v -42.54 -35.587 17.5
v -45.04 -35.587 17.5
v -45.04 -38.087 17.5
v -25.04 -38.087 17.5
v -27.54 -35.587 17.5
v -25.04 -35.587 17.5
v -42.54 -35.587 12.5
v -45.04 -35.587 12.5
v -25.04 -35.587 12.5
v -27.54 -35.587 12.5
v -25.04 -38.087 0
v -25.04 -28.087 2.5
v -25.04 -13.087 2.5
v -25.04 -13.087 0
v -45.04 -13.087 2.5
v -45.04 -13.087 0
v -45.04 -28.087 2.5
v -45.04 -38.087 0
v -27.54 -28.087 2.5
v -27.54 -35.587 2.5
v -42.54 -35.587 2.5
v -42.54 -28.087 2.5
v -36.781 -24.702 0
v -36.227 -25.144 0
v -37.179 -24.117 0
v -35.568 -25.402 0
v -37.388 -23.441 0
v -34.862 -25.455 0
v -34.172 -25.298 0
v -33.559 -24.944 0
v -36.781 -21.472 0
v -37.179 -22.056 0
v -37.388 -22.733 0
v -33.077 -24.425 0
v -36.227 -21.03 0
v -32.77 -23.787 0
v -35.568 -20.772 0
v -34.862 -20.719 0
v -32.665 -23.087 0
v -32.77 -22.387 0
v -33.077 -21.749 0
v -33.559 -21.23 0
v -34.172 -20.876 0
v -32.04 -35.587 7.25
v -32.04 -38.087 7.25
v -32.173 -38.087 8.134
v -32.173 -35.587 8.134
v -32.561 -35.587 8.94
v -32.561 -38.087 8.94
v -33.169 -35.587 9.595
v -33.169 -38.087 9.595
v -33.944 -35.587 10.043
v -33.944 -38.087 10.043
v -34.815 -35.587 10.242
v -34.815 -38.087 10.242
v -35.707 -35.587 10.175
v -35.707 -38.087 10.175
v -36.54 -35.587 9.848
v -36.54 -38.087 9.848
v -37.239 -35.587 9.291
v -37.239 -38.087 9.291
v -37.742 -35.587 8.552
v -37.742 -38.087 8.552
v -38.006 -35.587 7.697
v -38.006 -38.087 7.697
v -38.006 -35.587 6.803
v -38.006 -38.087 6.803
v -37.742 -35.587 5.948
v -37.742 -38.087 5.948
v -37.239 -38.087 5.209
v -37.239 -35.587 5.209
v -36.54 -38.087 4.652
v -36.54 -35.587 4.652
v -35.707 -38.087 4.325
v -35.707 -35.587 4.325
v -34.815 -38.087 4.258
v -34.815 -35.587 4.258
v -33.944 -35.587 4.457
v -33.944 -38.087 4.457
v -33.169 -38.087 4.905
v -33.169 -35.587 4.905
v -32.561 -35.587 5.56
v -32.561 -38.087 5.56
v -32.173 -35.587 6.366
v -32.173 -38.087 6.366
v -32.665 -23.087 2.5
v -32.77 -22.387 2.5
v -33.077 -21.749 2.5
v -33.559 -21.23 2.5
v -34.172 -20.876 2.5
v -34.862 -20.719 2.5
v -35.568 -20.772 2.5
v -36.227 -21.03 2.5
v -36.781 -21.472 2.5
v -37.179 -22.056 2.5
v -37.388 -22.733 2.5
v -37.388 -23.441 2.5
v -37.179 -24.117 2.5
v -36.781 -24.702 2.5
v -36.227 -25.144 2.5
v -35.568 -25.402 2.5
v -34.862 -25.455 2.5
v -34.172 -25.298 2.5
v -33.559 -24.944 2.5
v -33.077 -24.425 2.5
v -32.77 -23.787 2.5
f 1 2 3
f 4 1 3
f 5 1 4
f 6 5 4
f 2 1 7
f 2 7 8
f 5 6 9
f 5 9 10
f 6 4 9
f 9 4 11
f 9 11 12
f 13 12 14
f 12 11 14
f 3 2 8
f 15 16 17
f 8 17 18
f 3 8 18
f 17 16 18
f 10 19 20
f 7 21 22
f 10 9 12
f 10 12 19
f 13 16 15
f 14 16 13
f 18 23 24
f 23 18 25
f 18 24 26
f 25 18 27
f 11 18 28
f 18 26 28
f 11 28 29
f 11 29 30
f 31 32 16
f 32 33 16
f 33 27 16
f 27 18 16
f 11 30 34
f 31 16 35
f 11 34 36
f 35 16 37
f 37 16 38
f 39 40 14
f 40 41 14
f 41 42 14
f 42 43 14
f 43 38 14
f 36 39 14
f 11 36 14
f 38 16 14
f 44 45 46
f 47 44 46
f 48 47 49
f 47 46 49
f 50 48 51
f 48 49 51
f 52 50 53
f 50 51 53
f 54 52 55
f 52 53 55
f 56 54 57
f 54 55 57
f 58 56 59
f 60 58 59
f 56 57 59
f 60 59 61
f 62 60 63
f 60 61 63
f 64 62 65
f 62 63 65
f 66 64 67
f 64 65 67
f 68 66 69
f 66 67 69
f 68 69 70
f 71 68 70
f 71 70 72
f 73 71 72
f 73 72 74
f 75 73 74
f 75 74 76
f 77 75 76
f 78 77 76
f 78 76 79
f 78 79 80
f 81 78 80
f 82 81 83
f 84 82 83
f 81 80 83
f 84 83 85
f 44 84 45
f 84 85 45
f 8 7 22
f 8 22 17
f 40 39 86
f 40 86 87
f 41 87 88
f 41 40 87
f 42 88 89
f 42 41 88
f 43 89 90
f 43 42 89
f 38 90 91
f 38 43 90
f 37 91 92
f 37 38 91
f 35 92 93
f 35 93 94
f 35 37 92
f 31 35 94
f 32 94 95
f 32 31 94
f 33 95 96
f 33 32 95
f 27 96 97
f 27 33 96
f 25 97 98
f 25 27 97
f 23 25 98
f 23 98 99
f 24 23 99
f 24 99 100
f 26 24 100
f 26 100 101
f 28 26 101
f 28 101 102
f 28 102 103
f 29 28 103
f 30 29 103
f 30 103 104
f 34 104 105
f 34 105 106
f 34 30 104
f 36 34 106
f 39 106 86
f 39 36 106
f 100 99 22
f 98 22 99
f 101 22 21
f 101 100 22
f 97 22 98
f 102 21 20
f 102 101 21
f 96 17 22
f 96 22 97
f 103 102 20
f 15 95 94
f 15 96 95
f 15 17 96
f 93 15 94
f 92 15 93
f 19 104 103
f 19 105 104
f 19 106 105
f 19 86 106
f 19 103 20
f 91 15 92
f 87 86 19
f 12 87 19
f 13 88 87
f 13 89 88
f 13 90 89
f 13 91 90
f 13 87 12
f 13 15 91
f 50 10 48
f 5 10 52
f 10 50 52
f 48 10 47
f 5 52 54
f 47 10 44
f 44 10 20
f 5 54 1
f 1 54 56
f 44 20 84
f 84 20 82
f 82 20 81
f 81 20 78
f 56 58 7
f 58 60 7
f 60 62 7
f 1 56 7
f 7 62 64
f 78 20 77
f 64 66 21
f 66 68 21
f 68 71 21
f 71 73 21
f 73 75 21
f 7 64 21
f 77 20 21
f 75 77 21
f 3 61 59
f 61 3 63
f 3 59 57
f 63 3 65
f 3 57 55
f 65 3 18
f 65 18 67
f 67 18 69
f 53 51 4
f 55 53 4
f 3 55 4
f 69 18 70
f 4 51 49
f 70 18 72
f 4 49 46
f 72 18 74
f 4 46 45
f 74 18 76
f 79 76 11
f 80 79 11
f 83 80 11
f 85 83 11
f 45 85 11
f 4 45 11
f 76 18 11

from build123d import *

# Parameters (mm, degrees)
F0_W       = 20
F0_H       = 25
F0_R       = 2.375
F1_DEPTH   = 2.5
F3_DEPTH   = 10
F4_SIZE2   = 7.49999
F4_SIZE    = 9.99999
F4_2_SIZE2 = 7.49999
F4_2_SIZE  = 9.99999
F5_DEPTH   = 5
F6_R       = 3
F7_DEPTH   = 2.5


# Not quite as in the source:
# - a fillet or chamfer is up to 0.001 mm smaller than in the source, because OpenCascade refuses the exact size


with BuildPart() as f1:
    # F0 (on Top) → F1 (new body)
    with BuildSketch(Plane.XY):
        with Locations((-35.0395915519, -25.5869545043)):
            Rectangle(F0_W, F0_H)
        with Locations((-35.0395915519, -23.0869545043)):
            Circle(F0_R, mode=Mode.SUBTRACT)
    extrude(amount=F1_DEPTH)

    # F2 (on face) → F3 (join)
    with BuildSketch(Plane.XY.offset(2.5)):
        Polygon((-42.5395915519, -28.0869545043), (-45.0395915519, -28.0869545043), (-45.0395915519, -38.0869545043), (-25.0395915519, -38.0869545043), (-25.0395915519, -28.0869545043), (-27.5395915519, -28.0869545043), (-27.5395915519, -35.5869545043), (-42.5395915519, -35.5869545043), align=None)
    extrude(amount=F3_DEPTH)

    # F4 (size 10 and 7.5 in the source; OpenCascade refuses exactly that, so slightly less here)
    f4_edges = [f1.edges().sort_by_distance(p)[0] for p in [
        (-43.789592, -28.086955, 12.5),
    ]]
    f4_side = f1.faces().sort_by_distance((-43.789592, -28.086955, 7.5))[0]
    chamfer(f4_edges, length=F4_SIZE, length2=F4_SIZE2, reference=f4_side)

    # F4#2 (size 10 and 7.5 in the source; OpenCascade refuses exactly that, so slightly less here)
    f4_2_edges = [f1.edges().sort_by_distance(p)[0] for p in [
        (-26.289592, -28.086955, 12.5),
    ]]
    f4_2_side = f1.faces().sort_by_distance((-26.289592, -28.086955, 7.5))[0]
    chamfer(f4_2_edges, length=F4_2_SIZE, length2=F4_2_SIZE2, reference=f4_2_side)

    # F5 (add): a face of the model
    f5_faces = [f1.faces().sort_by_distance(p)[0] for p in [
        (-35.0395915519, -36.8369532542, 12.5),
    ]]
    extrude(f5_faces, amount=F5_DEPTH)

    # F6 (on face) → F7 (cut)
    with BuildSketch(Plane.XZ.offset(38.0869545043)):
        with Locations((-35.0395915519, 7.25)):
            Circle(F6_R)
    extrude(amount=-F7_DEPTH, mode=Mode.SUBTRACT)


solid = f1.part
